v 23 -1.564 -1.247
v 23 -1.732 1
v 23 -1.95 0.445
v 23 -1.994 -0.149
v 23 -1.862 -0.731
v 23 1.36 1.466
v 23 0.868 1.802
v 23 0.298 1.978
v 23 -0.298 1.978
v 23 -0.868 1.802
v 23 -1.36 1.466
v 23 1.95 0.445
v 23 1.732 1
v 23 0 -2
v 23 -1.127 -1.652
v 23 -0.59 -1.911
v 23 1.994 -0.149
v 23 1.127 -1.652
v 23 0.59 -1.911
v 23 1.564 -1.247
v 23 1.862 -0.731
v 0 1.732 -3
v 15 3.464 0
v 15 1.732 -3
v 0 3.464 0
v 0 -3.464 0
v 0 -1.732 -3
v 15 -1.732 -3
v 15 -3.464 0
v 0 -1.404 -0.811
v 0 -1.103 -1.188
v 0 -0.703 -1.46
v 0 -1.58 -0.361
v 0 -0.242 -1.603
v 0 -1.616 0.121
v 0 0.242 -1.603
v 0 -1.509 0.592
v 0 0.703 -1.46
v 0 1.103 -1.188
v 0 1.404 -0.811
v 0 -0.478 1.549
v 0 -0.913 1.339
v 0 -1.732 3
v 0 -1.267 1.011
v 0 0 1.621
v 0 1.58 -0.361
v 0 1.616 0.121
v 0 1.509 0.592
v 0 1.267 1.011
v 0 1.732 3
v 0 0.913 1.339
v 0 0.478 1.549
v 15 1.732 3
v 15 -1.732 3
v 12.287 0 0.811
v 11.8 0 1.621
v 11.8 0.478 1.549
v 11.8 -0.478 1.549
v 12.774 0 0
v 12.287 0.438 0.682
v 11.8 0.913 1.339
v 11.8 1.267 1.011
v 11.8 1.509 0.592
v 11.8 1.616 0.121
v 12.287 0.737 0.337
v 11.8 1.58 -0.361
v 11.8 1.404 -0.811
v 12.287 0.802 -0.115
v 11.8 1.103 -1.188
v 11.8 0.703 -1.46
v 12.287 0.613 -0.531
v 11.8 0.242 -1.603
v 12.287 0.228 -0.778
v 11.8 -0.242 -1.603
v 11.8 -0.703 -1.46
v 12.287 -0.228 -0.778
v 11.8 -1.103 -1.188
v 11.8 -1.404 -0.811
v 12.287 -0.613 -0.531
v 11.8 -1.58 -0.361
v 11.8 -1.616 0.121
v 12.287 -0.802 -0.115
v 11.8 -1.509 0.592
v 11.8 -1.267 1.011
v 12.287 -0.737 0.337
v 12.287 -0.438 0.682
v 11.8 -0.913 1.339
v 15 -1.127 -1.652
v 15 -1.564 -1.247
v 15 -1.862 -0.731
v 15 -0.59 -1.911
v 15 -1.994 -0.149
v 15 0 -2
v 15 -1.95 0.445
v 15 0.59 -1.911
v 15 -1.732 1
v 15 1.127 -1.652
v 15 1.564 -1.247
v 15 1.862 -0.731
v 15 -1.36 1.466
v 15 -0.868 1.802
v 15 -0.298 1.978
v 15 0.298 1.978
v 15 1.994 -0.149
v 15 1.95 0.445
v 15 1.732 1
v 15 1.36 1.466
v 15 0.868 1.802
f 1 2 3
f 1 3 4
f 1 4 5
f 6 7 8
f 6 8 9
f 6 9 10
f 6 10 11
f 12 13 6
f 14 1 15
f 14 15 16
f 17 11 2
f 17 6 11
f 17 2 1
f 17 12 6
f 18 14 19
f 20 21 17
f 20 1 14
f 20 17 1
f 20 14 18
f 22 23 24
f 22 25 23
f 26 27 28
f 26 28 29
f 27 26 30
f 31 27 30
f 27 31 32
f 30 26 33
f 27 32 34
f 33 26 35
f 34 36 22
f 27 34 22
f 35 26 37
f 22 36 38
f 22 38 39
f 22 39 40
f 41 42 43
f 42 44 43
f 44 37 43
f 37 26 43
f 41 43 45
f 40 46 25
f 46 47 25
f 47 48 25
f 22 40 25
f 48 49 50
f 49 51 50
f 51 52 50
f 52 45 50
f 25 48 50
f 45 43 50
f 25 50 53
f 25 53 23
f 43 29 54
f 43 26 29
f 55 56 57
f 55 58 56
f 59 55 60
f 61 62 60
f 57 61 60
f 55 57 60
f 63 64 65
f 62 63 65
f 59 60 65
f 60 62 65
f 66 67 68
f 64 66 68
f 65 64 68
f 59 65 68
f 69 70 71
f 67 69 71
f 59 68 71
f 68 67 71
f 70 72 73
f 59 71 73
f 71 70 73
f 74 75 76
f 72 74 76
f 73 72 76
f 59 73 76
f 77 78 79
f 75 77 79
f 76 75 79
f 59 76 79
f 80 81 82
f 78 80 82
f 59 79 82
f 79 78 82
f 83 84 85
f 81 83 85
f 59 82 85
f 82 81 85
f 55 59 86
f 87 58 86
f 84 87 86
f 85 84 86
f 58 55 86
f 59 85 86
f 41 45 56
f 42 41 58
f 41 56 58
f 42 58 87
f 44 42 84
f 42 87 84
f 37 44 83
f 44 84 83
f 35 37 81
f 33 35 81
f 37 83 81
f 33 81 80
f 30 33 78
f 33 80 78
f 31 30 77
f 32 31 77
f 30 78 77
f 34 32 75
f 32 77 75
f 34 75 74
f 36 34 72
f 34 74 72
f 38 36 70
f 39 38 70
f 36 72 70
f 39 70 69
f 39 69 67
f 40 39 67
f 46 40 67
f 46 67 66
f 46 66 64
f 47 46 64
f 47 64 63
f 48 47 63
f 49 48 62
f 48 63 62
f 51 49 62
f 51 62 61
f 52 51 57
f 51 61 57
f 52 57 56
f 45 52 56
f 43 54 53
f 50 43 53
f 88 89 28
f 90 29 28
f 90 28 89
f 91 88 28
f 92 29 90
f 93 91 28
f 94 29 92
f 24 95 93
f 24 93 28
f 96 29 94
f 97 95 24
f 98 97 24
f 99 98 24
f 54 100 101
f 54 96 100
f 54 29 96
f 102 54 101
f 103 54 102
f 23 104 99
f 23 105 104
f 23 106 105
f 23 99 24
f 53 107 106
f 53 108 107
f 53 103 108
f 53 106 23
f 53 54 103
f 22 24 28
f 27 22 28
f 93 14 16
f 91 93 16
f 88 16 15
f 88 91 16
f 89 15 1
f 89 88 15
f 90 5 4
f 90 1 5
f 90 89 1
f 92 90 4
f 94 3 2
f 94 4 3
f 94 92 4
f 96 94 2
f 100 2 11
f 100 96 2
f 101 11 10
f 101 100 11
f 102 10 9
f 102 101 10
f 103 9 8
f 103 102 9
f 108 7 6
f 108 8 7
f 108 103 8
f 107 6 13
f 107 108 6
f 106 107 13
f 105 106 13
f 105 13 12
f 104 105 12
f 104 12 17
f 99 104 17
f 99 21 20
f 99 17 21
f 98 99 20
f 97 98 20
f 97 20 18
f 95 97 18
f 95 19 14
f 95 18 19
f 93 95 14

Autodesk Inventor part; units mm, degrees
ref_plane "YZ Plane" through (0, 0, 0) normal (1, 0, 0) x (0, 1, 0)
ref_plane "XZ Plane" through (0, 0, 0) normal (0, 1, 0) x (-1, 0, 0)
ref_plane "XY Plane" through (0, 0, 0) normal (0, 0, 1) x (1, 0, 0)
sketch "スケッチ1" plane through (0, 0, 0) normal (1, 0, 0) x (0, 1, 0)
  line L0 (1.7321, -3) -> (-1.7321, -3)
  line L1 (-1.7321, -3) -> (-3.4641, 0)
  line L2 (-3.4641, 0) -> (-1.7321, 3)
  line L3 (-1.7321, 3) -> (1.7321, 3)
  line L4 (1.7321, 3) -> (3.4641, 0)
  line L5 (3.4641, 0) -> (1.7321, -3)
  point P0 (0, 0)
  point P1 (0, 0)
  dimension "d0" = 6
extrude "押し出し1" add sketch "スケッチ1" along normal blind 15
sketch "スケッチ2" plane through (15, 0, 0) normal (1, 0, 0) x (0, 0, -1)
  circle A0 centre (0, 0) radius 2
  dimension "d3" = 4
extrude "押し出し2" add sketch "スケッチ2" along normal blind 8
thread "ねじ1" size "M4x0.7" class "6g" standard "ANSI Metric M Profile" full length
sketch "スケッチ3" plane through (0, 0, 0) normal (-1, 0, 0) x (0, 0, 1)
  point P0 (0, 0)
  point P1 (0, 0)
hole "穴1" at (0, 0, 0) direction (1, 0, 0) diameter 3.242 depth 11.8 tip angle 118 thread size "M4x0.7" class "6H" standard "ISO Metric profile"
properties part number "Spacer_M3_L15" material "鋼、合金"
